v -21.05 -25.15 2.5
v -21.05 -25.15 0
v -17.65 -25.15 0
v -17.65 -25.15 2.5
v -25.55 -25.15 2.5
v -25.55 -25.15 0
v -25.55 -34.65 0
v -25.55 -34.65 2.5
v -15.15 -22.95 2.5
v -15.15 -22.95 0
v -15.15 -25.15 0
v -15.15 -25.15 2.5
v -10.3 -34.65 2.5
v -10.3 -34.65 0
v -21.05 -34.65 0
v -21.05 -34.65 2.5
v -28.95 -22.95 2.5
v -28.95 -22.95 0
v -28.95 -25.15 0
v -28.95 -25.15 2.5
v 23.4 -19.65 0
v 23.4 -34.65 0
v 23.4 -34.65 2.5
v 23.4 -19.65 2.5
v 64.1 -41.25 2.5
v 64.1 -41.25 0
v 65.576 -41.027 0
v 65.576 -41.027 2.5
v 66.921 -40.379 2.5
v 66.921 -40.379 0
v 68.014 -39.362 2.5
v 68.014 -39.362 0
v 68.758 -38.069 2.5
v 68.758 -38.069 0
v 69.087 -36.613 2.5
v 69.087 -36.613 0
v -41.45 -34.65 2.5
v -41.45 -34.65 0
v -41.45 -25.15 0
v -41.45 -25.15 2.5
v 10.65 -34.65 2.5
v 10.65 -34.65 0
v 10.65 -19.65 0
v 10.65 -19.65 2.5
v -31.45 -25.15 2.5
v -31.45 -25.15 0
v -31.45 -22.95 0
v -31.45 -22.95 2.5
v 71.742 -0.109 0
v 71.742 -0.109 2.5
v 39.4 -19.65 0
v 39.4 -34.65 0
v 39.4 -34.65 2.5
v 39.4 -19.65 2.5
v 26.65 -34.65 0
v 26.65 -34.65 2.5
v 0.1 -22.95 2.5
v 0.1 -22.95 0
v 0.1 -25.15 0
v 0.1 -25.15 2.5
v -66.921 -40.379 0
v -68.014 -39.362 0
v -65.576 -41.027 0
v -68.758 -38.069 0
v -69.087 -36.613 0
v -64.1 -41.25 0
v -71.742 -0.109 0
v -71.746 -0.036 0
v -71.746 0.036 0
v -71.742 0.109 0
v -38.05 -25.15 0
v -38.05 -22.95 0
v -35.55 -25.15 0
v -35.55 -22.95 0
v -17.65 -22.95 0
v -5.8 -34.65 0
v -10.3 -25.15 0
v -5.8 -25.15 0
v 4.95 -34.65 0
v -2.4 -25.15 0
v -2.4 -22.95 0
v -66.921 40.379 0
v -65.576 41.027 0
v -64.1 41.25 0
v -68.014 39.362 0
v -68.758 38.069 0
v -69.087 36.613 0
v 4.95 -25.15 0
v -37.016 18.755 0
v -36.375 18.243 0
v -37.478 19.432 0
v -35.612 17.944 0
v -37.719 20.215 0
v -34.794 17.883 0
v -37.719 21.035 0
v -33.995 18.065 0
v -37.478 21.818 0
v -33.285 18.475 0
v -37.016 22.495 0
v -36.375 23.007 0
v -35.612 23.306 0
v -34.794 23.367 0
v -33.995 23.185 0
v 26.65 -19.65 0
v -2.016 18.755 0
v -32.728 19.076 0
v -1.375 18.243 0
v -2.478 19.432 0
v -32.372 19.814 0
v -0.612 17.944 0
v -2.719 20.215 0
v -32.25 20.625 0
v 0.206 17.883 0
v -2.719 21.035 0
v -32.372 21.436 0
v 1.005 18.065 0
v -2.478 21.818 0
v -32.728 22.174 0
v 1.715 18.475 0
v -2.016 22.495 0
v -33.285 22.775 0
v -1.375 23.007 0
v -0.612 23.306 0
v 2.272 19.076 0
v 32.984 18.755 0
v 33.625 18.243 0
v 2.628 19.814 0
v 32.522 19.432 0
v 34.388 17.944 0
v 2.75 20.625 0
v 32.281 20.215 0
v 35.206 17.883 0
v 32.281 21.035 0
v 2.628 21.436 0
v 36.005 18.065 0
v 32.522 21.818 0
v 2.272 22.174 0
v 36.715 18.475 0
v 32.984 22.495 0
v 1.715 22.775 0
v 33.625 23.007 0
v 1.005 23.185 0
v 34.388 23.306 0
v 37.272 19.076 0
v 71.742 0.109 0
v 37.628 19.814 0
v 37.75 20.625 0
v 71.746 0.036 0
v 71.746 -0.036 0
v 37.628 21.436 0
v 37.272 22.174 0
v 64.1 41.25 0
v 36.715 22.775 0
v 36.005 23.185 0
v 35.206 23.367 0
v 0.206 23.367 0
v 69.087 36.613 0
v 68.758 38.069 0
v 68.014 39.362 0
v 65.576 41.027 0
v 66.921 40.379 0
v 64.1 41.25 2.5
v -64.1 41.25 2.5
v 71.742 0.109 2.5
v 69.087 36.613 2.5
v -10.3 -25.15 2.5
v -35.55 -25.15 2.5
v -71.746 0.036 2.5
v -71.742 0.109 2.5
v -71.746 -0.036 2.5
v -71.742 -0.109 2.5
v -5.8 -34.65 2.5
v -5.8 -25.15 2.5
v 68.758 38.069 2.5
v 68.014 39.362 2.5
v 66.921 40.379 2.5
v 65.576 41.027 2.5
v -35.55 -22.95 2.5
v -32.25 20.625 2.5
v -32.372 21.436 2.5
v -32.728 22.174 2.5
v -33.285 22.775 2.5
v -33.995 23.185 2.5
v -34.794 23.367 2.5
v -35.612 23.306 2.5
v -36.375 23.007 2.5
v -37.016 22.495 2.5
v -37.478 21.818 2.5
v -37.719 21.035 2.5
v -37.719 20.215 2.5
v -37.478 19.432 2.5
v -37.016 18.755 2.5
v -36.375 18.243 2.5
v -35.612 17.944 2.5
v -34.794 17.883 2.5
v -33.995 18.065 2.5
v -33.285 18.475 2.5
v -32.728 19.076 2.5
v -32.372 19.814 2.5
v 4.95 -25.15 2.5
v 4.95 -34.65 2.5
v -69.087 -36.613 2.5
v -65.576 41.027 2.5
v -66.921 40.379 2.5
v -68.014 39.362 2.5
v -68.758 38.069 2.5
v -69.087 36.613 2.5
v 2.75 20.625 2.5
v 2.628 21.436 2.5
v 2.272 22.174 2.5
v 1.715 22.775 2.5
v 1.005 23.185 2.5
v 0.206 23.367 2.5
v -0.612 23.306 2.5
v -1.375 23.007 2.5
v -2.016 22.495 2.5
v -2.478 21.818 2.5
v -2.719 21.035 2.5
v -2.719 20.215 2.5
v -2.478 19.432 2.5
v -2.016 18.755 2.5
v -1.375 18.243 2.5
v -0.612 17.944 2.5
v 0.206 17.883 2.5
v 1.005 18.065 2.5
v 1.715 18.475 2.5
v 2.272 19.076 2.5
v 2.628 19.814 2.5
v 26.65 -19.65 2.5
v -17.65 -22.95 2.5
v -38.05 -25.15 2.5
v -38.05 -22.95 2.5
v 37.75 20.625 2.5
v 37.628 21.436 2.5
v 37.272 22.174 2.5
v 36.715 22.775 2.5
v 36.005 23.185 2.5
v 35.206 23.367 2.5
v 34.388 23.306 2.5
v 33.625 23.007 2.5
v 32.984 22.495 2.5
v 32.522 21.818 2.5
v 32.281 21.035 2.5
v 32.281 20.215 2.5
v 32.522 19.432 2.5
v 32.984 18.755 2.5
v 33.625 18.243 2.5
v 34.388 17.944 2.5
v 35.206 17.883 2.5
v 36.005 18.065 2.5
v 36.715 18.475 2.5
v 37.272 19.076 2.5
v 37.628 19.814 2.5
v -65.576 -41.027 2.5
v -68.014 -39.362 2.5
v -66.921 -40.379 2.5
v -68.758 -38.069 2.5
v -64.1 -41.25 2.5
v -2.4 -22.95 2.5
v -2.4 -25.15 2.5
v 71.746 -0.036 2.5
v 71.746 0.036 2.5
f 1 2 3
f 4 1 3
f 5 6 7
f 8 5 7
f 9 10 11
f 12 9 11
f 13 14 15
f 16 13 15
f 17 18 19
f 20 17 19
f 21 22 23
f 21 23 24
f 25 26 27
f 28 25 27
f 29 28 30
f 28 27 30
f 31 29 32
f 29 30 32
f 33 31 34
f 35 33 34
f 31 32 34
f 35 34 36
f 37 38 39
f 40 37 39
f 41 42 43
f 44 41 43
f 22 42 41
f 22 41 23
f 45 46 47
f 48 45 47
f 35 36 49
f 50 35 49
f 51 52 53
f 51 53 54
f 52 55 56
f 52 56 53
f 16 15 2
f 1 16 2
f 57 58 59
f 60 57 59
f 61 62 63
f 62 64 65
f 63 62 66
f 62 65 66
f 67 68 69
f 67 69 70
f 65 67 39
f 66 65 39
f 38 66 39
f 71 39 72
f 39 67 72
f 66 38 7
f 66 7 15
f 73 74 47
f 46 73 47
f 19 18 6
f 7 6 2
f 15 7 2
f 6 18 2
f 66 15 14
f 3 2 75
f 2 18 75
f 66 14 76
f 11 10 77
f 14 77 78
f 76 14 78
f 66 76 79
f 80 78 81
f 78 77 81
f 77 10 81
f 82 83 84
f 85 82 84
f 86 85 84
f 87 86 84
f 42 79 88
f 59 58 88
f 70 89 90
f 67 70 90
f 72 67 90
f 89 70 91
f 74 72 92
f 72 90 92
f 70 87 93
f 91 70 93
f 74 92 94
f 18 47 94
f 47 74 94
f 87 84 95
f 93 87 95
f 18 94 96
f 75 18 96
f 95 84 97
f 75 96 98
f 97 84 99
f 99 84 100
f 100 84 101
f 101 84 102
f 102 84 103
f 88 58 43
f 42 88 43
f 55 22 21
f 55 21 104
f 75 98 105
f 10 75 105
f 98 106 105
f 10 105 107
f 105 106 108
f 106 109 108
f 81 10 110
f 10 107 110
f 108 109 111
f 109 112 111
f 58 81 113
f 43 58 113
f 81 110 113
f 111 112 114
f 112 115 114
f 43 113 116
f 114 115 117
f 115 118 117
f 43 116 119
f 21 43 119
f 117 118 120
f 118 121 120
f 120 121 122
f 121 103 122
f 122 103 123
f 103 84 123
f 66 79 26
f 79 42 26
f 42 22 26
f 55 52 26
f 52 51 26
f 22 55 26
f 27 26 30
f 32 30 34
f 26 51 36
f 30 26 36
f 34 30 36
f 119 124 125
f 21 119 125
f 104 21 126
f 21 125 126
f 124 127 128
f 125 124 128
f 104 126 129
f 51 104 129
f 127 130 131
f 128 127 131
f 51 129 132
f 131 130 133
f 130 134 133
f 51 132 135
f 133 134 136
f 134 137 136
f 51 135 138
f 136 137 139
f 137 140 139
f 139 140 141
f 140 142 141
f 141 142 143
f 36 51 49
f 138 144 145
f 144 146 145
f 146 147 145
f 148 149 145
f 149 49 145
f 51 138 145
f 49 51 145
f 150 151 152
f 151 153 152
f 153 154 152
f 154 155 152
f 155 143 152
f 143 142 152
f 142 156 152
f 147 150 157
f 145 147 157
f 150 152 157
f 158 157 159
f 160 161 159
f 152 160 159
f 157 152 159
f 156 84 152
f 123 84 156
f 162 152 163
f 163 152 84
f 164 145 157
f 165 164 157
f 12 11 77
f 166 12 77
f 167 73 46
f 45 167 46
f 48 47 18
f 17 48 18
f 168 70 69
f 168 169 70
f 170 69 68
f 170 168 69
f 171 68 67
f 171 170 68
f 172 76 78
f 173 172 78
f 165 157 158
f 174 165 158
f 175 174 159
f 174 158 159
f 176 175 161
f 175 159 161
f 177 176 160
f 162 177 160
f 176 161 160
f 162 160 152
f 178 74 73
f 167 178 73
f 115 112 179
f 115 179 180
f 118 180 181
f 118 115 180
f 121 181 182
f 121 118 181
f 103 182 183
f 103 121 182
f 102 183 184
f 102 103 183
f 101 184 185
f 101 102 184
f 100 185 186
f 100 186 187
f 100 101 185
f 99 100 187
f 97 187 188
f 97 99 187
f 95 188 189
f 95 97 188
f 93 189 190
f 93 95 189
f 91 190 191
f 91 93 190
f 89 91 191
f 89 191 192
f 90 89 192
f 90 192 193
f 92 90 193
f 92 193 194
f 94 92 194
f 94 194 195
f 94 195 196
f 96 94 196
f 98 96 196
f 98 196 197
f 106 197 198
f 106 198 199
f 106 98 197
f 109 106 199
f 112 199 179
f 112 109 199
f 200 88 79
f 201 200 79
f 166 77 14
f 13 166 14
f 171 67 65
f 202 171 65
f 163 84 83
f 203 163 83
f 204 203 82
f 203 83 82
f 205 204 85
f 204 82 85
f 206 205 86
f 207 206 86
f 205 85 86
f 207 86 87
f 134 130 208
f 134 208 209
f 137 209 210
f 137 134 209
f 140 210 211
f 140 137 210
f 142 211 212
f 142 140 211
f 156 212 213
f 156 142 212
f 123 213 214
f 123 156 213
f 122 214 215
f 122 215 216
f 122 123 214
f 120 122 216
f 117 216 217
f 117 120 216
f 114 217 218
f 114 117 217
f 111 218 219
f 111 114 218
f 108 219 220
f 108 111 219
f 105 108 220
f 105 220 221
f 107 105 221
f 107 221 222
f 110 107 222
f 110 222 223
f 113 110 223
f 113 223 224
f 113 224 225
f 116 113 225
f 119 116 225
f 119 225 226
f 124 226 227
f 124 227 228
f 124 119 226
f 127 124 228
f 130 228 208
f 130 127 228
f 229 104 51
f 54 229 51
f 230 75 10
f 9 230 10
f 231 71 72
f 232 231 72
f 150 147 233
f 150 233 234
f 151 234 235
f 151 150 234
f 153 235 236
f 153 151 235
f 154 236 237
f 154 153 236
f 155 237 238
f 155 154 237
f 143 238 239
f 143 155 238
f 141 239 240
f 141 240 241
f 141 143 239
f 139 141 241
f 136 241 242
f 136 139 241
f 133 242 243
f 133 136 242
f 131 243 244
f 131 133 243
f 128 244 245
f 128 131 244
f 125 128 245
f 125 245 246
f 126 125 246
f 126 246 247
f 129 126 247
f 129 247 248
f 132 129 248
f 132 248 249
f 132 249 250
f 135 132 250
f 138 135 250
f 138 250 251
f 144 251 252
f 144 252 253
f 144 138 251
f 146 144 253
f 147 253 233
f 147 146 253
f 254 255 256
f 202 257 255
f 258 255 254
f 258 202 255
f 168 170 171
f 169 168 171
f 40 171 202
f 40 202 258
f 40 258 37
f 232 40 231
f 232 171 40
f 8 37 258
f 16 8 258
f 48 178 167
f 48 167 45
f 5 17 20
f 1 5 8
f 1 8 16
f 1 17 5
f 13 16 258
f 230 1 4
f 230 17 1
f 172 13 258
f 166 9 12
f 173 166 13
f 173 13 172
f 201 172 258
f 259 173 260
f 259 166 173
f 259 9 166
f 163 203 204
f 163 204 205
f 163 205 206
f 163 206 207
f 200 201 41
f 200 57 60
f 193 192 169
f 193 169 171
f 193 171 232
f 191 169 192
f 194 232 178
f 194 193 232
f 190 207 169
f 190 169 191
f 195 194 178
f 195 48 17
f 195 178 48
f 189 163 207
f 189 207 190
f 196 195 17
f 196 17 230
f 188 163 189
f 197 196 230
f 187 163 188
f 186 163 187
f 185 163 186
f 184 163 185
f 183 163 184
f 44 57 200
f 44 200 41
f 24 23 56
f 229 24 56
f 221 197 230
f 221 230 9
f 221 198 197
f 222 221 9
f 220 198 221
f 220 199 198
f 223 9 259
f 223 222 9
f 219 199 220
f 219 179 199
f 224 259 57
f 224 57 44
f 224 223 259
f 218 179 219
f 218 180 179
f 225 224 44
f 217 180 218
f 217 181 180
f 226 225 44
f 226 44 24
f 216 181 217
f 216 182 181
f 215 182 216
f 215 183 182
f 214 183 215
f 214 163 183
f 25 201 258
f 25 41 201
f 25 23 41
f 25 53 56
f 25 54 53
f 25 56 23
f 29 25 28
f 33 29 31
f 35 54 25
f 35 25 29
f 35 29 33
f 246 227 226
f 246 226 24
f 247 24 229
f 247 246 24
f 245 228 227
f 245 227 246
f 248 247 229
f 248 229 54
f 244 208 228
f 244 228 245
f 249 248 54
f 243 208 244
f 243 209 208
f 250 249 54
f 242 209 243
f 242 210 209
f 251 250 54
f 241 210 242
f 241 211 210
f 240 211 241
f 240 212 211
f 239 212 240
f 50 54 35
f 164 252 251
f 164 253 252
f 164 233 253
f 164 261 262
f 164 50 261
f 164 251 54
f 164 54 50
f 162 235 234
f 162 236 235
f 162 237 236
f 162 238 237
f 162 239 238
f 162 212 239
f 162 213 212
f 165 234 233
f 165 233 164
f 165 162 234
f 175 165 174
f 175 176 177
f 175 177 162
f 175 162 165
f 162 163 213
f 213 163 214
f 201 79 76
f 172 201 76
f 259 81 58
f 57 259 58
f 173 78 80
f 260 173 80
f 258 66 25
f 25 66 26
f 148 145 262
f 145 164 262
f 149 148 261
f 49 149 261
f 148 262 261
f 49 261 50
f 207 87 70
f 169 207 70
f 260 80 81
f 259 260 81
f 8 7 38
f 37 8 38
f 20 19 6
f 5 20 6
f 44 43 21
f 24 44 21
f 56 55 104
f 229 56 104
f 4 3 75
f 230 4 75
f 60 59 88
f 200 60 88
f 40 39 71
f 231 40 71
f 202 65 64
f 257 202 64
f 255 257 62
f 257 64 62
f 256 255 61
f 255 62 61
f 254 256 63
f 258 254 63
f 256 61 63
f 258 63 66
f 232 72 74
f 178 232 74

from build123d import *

# Parameters (mm, degrees)
F0_W     = 12.75
F0_H     = 15
F0_R     = 2.75
F1_DEPTH = 2.5
F2_R     = 1.5


with BuildPart() as f1:
    # F0 (on Top) → F1 (new body)
    with BuildSketch(Plane.XY):
        with BuildLine():
            ThreePointArc((69.087259747, 36.6126784789), (67.5053247579, 39.9115155602), (64.1004306622, 41.25))
            Line((64.1004306622, 41.25), (-64.1004306622, 41.25))
            ThreePointArc((-64.1004306622, 41.25), (-67.5053247579, 39.9115155602), (-69.087259747, 36.6126784789))
            Line((-69.087259747, 36.6126784789), (-71.75, 0))
            Line((-71.75, 0), (-69.087259747, -36.6126784789))
            ThreePointArc((-69.087259747, -36.6126784789), (-67.5053247579, -39.9115155602), (-64.1004306622, -41.25))
            Line((-64.1004306622, -41.25), (64.1004306622, -41.25))
            ThreePointArc((64.1004306622, -41.25), (67.5053247579, -39.9115155602), (69.087259747, -36.6126784789))
            Line((69.087259747, -36.6126784789), (71.75, 0))
            Line((71.75, 0), (69.087259747, 36.6126784789))
        make_face()
        Polygon((-25.55, -25.15), (-25.55, -34.65), (-41.45, -34.65), (-41.45, -25.15), (-38.05, -25.15), (-38.05, -22.95), (-35.55, -22.95), (-35.55, -25.15), (-31.45, -25.15), (-31.45, -22.95), (-28.95, -22.95), (-28.95, -25.15), align=None, mode=Mode.SUBTRACT)
        Polygon((-10.3, -25.15), (-10.3, -34.65), (-21.05, -34.65), (-21.05, -25.15), (-17.65, -25.15), (-17.65, -22.95), (-15.15, -22.95), (-15.15, -25.15), align=None, mode=Mode.SUBTRACT)
        Polygon((4.95, -25.15), (4.95, -34.65), (-5.8, -34.65), (-5.8, -25.15), (-2.4, -25.15), (-2.4, -22.95), (0.1, -22.95), (0.1, -25.15), align=None, mode=Mode.SUBTRACT)
        with Locations((17.025, -27.15)):
            Rectangle(F0_W, F0_H, mode=Mode.SUBTRACT)
        with Locations((33.025, -27.15)):
            Rectangle(F0_W, F0_H, mode=Mode.SUBTRACT)
        with Locations((-35, 20.625)):
            Circle(F0_R, mode=Mode.SUBTRACT)
        with Locations((0, 20.625)):
            Circle(F0_R, mode=Mode.SUBTRACT)
        with Locations((35, 20.625)):
            Circle(F0_R, mode=Mode.SUBTRACT)
    extrude(amount=F1_DEPTH)

    # F2
    f2_edges = [f1.edges().sort_by_distance(p)[0] for p in [
        (-71.75, 0, 1.25),
        (71.75, 0, 1.25),
    ]]
    fillet(f2_edges, radius=F2_R)


solid = f1.part
